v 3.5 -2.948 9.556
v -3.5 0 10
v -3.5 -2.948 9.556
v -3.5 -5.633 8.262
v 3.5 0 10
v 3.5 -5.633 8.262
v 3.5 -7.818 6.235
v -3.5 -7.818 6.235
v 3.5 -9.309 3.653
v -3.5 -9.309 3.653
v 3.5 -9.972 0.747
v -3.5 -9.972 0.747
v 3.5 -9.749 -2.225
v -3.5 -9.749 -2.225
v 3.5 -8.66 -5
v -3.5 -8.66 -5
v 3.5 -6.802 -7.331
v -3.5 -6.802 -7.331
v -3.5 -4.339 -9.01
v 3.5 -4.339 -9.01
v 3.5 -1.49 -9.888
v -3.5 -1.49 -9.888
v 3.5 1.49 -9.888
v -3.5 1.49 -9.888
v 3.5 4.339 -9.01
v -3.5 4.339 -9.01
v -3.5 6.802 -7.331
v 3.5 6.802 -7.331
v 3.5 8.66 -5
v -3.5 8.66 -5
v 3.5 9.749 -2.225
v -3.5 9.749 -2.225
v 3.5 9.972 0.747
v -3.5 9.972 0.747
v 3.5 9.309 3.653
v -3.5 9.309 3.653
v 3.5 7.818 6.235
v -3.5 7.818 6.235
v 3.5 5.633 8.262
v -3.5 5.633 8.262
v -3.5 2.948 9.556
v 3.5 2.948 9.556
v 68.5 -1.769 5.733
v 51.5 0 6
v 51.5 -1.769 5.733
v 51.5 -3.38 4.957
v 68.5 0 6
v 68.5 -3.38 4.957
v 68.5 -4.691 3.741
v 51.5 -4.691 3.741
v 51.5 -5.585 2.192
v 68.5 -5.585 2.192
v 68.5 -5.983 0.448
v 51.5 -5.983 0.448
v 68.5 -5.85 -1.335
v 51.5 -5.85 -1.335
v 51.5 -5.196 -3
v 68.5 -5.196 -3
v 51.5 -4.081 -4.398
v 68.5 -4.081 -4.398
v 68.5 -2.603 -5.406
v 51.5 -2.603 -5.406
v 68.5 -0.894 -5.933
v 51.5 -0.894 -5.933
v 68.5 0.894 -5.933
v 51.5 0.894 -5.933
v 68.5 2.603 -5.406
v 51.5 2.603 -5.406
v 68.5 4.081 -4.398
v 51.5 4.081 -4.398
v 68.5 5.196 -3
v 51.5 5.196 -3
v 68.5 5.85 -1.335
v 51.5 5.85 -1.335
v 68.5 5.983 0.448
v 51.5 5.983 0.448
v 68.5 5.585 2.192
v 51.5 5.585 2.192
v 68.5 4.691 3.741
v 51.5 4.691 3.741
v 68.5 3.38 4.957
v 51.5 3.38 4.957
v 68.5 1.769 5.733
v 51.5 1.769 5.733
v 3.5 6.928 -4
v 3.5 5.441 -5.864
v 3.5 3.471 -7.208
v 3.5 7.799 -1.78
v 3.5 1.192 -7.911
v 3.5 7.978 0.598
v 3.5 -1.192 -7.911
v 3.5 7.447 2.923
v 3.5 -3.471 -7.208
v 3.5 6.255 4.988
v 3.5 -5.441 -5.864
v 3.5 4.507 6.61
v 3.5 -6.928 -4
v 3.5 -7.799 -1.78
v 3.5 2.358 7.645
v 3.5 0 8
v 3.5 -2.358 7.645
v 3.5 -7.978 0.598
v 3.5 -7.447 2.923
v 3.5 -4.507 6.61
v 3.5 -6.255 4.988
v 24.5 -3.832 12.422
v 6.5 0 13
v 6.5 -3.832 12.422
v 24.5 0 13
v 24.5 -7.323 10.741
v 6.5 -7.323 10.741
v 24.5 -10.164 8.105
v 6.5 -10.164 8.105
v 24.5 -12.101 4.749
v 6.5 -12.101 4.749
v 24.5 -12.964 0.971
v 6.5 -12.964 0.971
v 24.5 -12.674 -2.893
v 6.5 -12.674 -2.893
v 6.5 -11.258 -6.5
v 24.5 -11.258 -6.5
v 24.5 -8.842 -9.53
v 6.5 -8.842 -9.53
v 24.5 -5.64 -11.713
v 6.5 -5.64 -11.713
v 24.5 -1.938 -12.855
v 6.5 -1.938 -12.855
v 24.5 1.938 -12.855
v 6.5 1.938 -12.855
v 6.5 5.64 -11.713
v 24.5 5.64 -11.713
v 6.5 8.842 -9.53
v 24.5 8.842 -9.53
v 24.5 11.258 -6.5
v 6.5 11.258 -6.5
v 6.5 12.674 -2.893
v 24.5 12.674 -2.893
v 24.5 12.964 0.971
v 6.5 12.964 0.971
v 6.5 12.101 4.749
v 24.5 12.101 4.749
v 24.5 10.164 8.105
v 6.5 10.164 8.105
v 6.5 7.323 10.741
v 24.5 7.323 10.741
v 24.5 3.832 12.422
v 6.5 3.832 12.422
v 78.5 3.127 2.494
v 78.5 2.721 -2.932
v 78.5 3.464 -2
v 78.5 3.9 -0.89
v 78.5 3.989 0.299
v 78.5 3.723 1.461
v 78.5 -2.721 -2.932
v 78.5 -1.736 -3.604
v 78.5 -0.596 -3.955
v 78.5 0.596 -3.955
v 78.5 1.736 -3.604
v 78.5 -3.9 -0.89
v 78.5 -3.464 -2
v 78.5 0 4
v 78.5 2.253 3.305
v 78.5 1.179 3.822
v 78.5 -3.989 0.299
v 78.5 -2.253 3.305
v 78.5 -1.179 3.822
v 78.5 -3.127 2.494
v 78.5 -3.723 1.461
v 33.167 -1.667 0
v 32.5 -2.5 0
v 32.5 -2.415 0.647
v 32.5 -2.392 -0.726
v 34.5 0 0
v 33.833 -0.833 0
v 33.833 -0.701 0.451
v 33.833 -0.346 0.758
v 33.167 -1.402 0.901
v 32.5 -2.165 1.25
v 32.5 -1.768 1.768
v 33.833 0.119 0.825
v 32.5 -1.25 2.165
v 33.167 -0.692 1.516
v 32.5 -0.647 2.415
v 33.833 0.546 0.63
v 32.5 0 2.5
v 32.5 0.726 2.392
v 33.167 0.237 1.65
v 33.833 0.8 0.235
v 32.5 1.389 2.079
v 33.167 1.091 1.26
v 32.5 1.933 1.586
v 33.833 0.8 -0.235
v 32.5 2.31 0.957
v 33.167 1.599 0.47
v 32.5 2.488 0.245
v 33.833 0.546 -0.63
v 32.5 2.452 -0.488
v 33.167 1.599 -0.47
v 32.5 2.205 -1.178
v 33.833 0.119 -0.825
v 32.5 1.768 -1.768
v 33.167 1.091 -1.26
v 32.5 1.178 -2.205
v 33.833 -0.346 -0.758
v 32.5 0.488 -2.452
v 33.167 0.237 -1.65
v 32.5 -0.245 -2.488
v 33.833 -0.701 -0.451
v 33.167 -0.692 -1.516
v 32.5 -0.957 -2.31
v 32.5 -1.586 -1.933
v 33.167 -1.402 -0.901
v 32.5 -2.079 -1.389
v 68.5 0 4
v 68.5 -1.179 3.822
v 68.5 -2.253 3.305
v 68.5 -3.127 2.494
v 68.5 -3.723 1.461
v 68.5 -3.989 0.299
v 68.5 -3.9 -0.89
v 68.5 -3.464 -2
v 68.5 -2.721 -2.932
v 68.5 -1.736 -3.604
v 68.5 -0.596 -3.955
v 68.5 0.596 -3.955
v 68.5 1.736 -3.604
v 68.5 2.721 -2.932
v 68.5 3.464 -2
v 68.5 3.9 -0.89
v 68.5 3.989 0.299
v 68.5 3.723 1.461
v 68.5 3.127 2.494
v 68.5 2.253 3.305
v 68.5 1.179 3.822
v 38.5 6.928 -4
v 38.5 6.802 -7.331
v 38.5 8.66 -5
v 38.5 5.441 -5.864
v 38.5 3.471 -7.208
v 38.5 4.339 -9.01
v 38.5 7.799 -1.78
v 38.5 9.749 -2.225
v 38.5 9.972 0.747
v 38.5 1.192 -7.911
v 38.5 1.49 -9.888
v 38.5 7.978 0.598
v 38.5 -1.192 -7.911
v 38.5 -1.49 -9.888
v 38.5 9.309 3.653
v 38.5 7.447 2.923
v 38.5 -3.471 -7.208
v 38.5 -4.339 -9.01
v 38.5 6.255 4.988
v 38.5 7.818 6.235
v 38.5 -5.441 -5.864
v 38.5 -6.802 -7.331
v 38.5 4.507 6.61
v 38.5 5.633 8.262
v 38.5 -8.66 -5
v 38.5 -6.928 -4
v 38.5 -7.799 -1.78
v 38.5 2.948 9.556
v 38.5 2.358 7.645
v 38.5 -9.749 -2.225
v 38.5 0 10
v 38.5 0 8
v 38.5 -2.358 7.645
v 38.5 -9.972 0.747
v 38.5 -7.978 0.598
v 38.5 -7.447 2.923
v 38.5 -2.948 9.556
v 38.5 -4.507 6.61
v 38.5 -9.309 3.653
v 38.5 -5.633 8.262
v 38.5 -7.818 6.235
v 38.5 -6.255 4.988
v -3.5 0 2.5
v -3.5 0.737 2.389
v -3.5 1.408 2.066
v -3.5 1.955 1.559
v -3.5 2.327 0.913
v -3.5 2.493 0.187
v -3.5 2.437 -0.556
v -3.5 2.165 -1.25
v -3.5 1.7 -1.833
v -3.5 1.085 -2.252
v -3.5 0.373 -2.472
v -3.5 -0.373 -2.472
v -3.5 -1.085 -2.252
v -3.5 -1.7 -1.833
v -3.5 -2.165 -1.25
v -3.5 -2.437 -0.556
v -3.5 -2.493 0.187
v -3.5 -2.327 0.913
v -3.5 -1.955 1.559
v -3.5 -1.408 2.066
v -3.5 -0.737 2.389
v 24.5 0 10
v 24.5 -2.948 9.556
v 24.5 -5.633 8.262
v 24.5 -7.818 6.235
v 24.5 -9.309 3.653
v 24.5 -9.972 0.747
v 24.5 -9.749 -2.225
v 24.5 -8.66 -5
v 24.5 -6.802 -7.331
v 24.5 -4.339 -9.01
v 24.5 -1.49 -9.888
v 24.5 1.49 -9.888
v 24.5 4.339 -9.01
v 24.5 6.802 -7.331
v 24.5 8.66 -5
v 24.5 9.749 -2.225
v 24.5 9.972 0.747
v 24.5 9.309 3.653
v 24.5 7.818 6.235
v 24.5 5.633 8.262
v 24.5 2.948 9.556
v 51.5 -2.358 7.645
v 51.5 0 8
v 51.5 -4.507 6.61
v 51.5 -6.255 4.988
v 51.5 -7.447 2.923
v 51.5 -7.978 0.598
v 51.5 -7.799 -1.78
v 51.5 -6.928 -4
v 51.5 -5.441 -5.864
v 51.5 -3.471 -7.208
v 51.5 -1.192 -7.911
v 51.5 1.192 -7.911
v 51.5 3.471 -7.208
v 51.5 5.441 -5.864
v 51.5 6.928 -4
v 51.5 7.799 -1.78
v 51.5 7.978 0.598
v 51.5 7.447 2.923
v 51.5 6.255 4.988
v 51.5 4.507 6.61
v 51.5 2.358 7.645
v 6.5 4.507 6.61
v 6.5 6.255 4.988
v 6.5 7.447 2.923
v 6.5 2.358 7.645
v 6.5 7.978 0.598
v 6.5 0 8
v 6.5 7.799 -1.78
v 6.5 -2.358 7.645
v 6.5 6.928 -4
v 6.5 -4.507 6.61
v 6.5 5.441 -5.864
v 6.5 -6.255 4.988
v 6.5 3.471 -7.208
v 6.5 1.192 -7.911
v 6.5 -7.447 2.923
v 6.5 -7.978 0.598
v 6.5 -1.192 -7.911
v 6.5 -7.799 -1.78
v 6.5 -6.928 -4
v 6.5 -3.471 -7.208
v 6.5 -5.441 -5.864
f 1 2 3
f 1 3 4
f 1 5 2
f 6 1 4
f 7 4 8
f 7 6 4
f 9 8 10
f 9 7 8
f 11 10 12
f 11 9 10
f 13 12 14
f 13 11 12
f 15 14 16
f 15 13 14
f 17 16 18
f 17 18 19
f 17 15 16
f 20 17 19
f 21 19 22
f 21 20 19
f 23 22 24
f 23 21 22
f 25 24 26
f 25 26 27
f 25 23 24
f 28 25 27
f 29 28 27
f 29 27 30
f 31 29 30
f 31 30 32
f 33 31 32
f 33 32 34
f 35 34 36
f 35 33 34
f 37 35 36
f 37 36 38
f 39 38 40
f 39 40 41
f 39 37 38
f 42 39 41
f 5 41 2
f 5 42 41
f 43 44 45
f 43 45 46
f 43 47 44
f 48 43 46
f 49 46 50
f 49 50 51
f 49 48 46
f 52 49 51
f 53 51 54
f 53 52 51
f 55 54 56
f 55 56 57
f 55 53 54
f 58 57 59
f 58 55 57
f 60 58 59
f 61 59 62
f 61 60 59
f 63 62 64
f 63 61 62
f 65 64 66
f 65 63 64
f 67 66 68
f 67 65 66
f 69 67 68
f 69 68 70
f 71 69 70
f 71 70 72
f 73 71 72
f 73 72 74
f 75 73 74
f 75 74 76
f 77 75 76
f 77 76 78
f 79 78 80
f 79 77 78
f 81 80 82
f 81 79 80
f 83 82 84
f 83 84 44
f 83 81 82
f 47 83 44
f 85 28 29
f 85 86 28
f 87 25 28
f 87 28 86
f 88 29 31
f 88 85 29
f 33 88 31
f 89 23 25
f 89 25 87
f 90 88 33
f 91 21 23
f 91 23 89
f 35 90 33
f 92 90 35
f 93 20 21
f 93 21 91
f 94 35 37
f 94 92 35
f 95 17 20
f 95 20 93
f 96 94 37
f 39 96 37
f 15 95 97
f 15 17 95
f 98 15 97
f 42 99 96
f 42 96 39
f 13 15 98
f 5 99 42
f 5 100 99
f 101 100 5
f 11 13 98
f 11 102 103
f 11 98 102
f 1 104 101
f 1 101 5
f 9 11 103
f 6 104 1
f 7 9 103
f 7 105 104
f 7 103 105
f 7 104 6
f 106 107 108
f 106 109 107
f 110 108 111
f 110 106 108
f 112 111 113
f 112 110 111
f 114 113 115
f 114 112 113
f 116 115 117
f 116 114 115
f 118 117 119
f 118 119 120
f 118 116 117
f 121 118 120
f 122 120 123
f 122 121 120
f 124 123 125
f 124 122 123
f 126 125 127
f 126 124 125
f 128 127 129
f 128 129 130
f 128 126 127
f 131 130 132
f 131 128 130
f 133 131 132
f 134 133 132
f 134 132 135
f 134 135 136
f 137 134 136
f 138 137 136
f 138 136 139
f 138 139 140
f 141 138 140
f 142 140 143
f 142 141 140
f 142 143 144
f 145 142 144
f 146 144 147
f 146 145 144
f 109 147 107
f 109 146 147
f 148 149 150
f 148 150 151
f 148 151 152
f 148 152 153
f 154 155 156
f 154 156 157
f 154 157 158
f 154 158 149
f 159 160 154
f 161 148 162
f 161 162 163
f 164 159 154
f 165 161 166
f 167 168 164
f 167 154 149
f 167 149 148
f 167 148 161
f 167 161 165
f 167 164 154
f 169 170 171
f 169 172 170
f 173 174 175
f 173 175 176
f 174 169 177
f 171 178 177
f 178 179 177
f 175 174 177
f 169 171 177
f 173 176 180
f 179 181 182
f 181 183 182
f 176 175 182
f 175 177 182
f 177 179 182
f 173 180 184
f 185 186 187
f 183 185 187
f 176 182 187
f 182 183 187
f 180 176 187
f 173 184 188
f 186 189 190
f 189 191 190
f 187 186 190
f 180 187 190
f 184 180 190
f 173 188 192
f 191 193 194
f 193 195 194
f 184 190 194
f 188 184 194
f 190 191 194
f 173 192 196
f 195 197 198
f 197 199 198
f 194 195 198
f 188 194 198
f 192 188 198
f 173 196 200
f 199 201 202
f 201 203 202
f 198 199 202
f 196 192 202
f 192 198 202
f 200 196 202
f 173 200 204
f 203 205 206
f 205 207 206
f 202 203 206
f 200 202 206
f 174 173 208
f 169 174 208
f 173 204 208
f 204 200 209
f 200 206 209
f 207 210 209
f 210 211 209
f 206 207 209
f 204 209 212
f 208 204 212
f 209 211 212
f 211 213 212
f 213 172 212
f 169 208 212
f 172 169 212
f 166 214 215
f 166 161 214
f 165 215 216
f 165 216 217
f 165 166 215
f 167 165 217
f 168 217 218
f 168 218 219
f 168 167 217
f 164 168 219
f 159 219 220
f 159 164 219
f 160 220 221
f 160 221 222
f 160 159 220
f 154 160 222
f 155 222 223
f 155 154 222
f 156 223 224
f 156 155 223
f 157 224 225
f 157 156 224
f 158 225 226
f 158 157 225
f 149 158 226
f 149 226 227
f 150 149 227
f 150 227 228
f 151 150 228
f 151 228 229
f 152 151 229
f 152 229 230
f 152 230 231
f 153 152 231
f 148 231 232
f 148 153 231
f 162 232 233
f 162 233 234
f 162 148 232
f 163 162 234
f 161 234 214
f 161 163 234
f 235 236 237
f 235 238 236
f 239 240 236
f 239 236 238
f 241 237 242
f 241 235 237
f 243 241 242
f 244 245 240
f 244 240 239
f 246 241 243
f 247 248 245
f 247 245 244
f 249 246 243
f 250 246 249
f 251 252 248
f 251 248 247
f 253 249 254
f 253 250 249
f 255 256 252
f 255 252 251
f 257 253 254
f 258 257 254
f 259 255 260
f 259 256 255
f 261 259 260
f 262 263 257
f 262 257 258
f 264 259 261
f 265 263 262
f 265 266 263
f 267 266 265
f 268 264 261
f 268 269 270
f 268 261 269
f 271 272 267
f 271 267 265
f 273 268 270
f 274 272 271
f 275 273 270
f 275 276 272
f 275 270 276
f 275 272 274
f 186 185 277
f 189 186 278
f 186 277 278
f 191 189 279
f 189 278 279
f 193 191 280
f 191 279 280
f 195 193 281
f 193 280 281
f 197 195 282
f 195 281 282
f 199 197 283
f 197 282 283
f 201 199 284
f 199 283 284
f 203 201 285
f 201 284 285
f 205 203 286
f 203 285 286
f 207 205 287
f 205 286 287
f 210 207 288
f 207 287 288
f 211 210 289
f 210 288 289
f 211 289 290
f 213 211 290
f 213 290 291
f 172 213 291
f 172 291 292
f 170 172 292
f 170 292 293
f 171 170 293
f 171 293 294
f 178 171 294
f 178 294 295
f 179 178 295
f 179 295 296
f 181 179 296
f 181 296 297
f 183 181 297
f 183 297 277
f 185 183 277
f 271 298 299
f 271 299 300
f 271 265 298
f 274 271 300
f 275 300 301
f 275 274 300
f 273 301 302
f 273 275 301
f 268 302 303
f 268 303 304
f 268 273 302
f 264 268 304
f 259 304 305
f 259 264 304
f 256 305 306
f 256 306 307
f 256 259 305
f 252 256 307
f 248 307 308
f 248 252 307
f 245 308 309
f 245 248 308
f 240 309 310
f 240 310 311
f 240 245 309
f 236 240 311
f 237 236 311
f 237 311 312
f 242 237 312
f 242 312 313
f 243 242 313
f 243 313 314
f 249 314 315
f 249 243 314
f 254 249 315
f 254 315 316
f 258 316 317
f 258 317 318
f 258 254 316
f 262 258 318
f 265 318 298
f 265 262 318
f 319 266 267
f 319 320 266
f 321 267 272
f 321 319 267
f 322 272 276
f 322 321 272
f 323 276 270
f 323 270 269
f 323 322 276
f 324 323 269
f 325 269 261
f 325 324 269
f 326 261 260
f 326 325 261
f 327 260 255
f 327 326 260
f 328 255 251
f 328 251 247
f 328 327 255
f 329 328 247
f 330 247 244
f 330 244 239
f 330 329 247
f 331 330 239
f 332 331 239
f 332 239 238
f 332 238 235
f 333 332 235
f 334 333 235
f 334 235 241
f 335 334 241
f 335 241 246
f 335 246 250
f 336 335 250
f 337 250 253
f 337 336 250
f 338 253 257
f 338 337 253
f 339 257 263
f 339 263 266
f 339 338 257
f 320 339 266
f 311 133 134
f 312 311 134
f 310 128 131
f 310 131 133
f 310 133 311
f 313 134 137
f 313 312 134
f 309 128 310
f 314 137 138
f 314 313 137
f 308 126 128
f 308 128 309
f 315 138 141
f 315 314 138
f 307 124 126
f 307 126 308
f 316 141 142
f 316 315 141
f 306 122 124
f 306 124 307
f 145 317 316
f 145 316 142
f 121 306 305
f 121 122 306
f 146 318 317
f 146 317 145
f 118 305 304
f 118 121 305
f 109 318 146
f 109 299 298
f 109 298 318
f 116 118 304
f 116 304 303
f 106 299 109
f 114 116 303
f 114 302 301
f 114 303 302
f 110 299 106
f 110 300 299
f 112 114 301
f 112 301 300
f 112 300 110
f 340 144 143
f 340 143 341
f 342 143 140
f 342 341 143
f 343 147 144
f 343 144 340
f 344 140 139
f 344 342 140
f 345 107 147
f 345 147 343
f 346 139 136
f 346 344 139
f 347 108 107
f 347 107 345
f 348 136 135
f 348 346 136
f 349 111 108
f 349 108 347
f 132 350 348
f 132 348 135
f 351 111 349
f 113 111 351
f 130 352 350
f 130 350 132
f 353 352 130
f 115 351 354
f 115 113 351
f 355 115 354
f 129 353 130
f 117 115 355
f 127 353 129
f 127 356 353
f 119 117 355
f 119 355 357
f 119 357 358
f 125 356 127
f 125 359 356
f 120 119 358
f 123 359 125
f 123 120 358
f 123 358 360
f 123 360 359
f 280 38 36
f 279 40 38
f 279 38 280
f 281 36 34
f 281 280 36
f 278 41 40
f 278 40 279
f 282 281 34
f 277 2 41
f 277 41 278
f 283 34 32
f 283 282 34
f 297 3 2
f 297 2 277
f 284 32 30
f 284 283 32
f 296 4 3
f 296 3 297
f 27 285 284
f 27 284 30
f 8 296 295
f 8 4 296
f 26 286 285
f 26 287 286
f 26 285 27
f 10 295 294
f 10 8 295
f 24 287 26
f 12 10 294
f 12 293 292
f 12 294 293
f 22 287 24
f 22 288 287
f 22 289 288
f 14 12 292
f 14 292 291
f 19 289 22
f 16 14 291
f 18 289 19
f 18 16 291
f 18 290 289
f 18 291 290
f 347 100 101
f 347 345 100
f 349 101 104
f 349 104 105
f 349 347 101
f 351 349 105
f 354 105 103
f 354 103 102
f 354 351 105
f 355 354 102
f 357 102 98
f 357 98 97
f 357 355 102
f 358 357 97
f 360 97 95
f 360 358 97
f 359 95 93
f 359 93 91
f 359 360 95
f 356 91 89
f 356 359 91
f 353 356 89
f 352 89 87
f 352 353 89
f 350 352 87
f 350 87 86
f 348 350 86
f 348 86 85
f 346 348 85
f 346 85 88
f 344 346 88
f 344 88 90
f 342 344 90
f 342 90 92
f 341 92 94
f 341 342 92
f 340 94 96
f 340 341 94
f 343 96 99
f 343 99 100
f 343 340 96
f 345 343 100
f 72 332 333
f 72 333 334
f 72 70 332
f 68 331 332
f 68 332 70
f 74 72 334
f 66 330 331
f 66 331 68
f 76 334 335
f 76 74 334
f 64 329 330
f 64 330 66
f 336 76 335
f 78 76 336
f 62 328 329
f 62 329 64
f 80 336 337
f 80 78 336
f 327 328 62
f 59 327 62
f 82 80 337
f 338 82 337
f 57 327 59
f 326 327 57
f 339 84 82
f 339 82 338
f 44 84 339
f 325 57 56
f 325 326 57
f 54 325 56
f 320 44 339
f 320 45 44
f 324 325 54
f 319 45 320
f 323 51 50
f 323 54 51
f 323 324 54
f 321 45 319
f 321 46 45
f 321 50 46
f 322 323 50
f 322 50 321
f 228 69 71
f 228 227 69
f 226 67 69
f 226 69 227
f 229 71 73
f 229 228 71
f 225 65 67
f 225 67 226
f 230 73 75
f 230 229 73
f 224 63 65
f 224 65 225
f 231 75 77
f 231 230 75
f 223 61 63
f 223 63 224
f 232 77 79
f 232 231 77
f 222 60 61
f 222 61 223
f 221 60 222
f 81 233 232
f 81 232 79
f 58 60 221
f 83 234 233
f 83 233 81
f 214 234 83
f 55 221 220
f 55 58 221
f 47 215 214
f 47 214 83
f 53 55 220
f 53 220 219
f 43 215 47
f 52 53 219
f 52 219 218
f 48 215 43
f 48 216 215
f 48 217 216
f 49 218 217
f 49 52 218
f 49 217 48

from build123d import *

# Parameters (mm, degrees)
SKETCH1_W          = 3
SKETCH1_H          = 8
SKETCH1_W_2        = 10
SKETCH1_H_2        = 4
SKETCH2_R          = 2.5
CUT_EXTRUDE1_DEPTH = 36


with BuildPart() as part:
    # Sketch1 → Revolve2 (revolve)
    with BuildSketch(Plane(origin=(0, 0, 0), x_dir=(1, 0, 0), z_dir=(0, 1, 0))):
        Polygon((3.5, 0), (-3.5, 0), (-3.5, -10), (3.5, -10), (3.5, -8), align=None)
        with Locations((5, -4)):
            Rectangle(SKETCH1_W, SKETCH1_H)
        Polygon((24.5, 0), (6.5, 0), (6.5, -8), (6.5, -13), (24.5, -13), (24.5, -10), align=None)
        Polygon((38.5, 0), (24.5, 0), (24.5, -10), (38.5, -10), (38.5, -8), align=None)
        Polygon((51.5, 0), (38.5, 0), (38.5, -8), (51.5, -8), (51.5, -6), align=None)
        Polygon((68.5, 0), (51.5, 0), (51.5, -6), (68.5, -6), (68.5, -4), align=None)
        with Locations((73.5, -2)):
            Rectangle(SKETCH1_W_2, SKETCH1_H_2)
    revolve(axis=Axis((-3.5, 0, 0), (1, 0, 0)))

    # Sketch2 → Cut-Extrude1 (cut)
    with BuildSketch(Plane.ZY.offset(3.5)):
        Circle(SKETCH2_R)
    extrude(amount=-CUT_EXTRUDE1_DEPTH, mode=Mode.SUBTRACT)

    # Sketch3 → Cut-Revolve2 (revolve, cut)
    with BuildSketch(Plane.XY):
        Polygon((32.5, 0), (34.5, 0), (32.5, -2.5), align=None)
    revolve(axis=Axis((34.5, 0, 0), (-1, 0, 0)), mode=Mode.SUBTRACT)


solid = part.part
